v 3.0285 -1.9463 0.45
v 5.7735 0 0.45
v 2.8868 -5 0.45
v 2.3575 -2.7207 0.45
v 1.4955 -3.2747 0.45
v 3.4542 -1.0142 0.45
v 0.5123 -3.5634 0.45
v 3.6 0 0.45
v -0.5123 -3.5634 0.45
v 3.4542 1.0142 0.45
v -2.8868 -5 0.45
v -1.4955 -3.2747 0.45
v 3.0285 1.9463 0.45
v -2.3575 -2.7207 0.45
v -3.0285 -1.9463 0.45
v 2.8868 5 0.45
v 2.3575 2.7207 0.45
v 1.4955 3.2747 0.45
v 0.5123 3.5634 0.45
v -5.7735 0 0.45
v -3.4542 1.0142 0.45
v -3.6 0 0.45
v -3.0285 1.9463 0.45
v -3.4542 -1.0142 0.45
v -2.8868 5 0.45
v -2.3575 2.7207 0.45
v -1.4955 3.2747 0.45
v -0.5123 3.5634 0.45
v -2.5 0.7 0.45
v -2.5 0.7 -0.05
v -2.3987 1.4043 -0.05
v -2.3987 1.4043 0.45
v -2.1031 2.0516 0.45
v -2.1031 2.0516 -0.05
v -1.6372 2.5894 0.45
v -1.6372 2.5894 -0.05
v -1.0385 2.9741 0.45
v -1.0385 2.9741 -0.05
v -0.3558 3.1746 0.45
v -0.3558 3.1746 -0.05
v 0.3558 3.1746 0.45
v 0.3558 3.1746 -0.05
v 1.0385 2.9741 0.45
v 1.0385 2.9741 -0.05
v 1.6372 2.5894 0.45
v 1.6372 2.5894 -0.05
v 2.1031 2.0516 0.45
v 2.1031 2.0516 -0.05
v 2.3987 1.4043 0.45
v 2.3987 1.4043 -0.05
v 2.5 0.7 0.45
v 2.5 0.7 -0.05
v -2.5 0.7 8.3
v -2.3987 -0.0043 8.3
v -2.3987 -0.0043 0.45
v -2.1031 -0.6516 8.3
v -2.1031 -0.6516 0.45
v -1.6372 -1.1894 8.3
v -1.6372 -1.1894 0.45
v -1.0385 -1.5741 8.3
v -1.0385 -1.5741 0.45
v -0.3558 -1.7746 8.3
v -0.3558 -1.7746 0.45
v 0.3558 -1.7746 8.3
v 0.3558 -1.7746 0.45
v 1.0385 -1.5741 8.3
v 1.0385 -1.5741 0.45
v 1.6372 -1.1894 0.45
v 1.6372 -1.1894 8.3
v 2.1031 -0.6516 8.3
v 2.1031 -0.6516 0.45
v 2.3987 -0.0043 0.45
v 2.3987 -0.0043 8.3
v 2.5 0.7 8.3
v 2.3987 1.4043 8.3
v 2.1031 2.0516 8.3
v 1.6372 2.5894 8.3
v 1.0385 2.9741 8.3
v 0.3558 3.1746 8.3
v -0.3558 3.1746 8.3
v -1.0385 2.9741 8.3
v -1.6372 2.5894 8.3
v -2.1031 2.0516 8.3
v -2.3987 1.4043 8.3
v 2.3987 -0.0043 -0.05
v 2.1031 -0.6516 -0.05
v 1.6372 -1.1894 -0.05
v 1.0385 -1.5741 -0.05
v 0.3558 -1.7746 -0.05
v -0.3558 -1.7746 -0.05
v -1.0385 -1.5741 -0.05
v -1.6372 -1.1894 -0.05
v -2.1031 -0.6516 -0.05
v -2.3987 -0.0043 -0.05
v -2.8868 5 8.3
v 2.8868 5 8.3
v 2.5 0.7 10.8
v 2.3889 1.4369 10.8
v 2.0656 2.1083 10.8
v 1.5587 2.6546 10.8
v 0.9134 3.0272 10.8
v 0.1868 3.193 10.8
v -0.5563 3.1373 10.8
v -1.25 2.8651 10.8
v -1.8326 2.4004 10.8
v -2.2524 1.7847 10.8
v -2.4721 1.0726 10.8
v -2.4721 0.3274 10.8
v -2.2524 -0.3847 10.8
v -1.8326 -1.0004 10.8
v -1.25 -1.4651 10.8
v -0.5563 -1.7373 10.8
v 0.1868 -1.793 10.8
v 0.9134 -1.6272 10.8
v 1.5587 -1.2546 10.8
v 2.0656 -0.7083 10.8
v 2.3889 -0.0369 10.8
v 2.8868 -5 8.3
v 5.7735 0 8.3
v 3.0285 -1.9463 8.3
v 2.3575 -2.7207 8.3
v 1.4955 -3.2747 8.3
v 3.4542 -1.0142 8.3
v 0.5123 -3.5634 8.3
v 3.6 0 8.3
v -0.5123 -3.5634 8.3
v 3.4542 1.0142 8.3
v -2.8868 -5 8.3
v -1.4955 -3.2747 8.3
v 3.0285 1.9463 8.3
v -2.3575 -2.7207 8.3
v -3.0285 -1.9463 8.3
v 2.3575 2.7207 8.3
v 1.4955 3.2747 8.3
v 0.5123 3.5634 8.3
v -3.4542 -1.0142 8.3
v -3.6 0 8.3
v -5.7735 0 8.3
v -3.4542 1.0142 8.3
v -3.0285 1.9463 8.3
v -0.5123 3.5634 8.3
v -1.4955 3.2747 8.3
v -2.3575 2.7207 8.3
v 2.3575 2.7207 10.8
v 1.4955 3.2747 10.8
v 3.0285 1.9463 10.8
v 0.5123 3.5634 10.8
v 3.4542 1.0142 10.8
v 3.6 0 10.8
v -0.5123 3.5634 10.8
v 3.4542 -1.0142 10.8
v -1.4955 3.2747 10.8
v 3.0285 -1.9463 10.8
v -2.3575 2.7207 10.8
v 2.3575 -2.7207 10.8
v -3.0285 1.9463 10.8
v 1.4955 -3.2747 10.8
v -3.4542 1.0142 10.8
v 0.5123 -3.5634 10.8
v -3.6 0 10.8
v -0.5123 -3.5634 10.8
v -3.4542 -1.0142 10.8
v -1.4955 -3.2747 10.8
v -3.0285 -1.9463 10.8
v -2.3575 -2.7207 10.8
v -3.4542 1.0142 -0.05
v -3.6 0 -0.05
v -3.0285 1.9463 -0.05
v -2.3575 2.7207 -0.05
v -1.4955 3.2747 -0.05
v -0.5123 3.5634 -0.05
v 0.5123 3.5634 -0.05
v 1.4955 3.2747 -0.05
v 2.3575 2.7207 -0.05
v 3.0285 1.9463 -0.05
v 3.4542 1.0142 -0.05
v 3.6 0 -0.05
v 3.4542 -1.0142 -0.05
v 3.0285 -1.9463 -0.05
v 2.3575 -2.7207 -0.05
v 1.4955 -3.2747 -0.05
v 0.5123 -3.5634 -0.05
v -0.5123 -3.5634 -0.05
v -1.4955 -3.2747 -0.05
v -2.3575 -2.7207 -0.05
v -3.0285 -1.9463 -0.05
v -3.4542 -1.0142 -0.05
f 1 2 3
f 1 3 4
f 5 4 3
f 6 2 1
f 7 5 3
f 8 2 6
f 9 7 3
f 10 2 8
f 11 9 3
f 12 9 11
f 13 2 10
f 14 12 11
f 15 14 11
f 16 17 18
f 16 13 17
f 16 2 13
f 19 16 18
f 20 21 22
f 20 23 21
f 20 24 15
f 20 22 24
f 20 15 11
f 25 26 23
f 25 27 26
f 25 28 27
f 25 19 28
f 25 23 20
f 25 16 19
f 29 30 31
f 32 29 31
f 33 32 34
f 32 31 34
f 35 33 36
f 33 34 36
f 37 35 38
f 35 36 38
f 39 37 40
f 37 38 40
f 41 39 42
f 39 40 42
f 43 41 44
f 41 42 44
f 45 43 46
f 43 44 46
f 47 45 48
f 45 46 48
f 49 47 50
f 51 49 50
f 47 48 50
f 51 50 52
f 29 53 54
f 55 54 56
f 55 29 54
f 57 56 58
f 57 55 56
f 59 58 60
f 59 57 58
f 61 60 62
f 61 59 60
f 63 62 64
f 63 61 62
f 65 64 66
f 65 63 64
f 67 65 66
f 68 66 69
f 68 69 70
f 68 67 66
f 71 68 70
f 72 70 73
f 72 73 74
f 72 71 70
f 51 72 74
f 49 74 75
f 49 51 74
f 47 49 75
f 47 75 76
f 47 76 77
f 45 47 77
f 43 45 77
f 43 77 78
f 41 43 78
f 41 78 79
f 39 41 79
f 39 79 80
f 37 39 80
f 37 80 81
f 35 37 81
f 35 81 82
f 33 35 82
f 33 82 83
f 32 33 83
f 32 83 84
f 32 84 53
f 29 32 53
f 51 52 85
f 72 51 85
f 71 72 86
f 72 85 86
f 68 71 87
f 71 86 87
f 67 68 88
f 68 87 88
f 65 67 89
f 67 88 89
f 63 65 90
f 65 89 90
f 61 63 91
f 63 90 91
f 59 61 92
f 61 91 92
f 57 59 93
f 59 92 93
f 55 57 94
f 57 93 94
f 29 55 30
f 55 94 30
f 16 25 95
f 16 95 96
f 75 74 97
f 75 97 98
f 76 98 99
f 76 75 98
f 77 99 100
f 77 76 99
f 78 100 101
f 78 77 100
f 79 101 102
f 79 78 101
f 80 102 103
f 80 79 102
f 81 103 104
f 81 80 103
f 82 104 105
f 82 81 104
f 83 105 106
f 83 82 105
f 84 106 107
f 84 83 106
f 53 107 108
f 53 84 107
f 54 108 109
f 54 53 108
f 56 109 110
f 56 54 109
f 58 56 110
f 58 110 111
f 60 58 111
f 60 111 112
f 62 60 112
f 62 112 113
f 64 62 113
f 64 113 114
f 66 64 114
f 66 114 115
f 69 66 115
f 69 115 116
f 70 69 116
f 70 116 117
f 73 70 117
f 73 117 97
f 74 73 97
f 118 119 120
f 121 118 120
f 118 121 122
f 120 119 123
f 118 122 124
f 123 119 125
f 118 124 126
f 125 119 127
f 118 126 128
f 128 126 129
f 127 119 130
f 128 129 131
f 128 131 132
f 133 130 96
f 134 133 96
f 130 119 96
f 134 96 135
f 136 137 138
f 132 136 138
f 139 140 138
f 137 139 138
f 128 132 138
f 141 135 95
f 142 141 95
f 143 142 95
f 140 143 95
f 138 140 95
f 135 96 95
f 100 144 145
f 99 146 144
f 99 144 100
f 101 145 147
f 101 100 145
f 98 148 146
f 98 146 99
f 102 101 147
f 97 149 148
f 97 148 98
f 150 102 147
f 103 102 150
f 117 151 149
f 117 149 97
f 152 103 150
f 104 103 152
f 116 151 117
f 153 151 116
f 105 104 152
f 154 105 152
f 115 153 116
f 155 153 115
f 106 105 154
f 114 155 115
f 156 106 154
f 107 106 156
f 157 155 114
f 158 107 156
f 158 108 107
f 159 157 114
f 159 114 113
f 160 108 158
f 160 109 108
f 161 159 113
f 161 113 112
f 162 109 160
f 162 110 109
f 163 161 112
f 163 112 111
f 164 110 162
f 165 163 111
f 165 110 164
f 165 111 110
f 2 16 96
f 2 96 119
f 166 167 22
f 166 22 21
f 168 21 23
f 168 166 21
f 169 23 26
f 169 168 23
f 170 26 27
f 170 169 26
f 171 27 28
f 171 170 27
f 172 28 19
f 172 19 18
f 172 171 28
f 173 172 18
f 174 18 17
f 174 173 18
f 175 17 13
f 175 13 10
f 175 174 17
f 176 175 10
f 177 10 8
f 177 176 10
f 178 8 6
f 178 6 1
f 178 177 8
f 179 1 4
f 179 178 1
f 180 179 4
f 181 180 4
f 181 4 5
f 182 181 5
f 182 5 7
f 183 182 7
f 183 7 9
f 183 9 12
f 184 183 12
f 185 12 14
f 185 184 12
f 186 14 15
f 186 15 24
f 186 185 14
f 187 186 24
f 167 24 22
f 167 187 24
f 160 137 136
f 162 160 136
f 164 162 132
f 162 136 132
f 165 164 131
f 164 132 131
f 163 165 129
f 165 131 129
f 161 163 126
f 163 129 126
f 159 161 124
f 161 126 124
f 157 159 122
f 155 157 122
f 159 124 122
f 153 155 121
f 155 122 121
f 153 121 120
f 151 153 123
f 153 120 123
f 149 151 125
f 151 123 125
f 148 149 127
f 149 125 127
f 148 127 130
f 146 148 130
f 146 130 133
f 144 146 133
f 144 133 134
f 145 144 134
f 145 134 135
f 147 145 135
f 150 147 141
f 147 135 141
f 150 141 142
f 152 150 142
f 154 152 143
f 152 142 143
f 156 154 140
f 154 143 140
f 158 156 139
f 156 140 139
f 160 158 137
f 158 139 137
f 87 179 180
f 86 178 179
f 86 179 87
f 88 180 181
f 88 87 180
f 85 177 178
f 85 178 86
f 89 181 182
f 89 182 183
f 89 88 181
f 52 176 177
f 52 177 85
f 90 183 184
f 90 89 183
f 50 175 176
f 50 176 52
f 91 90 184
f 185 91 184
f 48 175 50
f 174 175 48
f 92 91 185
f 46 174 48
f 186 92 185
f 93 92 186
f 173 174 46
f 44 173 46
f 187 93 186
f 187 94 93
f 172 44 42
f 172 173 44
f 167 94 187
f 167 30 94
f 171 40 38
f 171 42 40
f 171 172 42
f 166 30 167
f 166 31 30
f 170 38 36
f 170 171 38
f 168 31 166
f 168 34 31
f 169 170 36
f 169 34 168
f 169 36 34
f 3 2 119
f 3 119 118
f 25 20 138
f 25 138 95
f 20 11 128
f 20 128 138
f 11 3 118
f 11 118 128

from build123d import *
from build123d.topology import SkipClean

# Parameters (mm, degrees)
SALIENTE_EXTRUIR1_DEPTH = 7.85
CROQUIS6_R              = 3.6
CROQUIS6_R_2            = 2.5
SALIENTE_EXTRUIR2_DEPTH = 2.5
SALIENTE_EXTRUIR3_START = 0.5
CROQUIS7_R              = 3.6
CROQUIS7_R_2            = 2.5
SALIENTE_EXTRUIR3_DEPTH = 0.5
CORTAR_EXTRUIR1_START   = -8.5
CROQUIS9_R              = 2.5
CORTAR_EXTRUIR1_DEPTH   = 8.5


with BuildPart() as part:
    # Croquis1 → Saliente-Extruir1 (new body)
    with BuildSketch(Plane(origin=(0, 0, 0.45), x_dir=(-1, 0, 0), z_dir=(0, 0, -1))):
        Polygon((2.886751346, -5), (5.773502692, 0), (2.886751346, 5), (-2.886751346, 5), (-5.773502692, 0), (-2.886751346, -5), align=None)
    extrude(amount=-SALIENTE_EXTRUIR1_DEPTH)

    # Croquis6 → Saliente-Extruir2 (add)
    with BuildSketch(Plane.XY.offset(8.3)):
        with Locations(Location((0, 0, 0), (0, 0, 180))):
            Circle(CROQUIS6_R)
        with Locations((0, 0.7)):
            Circle(CROQUIS6_R_2, mode=Mode.SUBTRACT)
    extrude(amount=SALIENTE_EXTRUIR2_DEPTH)

    # Croquis7 → Saliente-Extruir3 (add)
    with BuildSketch(Plane(origin=(0, 0, 0.45), x_dir=(-1, 0, 0), z_dir=(0, 0, -1)).offset(SALIENTE_EXTRUIR3_START)):
        Circle(CROQUIS7_R)
        with Locations(Location((0, 0.7, 0), (0, 0, 180))):
            Circle(CROQUIS7_R_2, mode=Mode.SUBTRACT)
    extrude(amount=-SALIENTE_EXTRUIR3_DEPTH)

    # Croquis9 → Cortar-Extruir1 (cut)
    with SkipClean():  # the faces are left unmerged after this step: merging them gives an invalid solid
        with BuildSketch(Plane.XY.offset(8.3).offset(CORTAR_EXTRUIR1_START)):
            with Locations(Location((0, 0.7, 0), (0, 0, 180))):
                Circle(CROQUIS9_R)
        extrude(amount=CORTAR_EXTRUIR1_DEPTH, mode=Mode.SUBTRACT)


solid = part.part
